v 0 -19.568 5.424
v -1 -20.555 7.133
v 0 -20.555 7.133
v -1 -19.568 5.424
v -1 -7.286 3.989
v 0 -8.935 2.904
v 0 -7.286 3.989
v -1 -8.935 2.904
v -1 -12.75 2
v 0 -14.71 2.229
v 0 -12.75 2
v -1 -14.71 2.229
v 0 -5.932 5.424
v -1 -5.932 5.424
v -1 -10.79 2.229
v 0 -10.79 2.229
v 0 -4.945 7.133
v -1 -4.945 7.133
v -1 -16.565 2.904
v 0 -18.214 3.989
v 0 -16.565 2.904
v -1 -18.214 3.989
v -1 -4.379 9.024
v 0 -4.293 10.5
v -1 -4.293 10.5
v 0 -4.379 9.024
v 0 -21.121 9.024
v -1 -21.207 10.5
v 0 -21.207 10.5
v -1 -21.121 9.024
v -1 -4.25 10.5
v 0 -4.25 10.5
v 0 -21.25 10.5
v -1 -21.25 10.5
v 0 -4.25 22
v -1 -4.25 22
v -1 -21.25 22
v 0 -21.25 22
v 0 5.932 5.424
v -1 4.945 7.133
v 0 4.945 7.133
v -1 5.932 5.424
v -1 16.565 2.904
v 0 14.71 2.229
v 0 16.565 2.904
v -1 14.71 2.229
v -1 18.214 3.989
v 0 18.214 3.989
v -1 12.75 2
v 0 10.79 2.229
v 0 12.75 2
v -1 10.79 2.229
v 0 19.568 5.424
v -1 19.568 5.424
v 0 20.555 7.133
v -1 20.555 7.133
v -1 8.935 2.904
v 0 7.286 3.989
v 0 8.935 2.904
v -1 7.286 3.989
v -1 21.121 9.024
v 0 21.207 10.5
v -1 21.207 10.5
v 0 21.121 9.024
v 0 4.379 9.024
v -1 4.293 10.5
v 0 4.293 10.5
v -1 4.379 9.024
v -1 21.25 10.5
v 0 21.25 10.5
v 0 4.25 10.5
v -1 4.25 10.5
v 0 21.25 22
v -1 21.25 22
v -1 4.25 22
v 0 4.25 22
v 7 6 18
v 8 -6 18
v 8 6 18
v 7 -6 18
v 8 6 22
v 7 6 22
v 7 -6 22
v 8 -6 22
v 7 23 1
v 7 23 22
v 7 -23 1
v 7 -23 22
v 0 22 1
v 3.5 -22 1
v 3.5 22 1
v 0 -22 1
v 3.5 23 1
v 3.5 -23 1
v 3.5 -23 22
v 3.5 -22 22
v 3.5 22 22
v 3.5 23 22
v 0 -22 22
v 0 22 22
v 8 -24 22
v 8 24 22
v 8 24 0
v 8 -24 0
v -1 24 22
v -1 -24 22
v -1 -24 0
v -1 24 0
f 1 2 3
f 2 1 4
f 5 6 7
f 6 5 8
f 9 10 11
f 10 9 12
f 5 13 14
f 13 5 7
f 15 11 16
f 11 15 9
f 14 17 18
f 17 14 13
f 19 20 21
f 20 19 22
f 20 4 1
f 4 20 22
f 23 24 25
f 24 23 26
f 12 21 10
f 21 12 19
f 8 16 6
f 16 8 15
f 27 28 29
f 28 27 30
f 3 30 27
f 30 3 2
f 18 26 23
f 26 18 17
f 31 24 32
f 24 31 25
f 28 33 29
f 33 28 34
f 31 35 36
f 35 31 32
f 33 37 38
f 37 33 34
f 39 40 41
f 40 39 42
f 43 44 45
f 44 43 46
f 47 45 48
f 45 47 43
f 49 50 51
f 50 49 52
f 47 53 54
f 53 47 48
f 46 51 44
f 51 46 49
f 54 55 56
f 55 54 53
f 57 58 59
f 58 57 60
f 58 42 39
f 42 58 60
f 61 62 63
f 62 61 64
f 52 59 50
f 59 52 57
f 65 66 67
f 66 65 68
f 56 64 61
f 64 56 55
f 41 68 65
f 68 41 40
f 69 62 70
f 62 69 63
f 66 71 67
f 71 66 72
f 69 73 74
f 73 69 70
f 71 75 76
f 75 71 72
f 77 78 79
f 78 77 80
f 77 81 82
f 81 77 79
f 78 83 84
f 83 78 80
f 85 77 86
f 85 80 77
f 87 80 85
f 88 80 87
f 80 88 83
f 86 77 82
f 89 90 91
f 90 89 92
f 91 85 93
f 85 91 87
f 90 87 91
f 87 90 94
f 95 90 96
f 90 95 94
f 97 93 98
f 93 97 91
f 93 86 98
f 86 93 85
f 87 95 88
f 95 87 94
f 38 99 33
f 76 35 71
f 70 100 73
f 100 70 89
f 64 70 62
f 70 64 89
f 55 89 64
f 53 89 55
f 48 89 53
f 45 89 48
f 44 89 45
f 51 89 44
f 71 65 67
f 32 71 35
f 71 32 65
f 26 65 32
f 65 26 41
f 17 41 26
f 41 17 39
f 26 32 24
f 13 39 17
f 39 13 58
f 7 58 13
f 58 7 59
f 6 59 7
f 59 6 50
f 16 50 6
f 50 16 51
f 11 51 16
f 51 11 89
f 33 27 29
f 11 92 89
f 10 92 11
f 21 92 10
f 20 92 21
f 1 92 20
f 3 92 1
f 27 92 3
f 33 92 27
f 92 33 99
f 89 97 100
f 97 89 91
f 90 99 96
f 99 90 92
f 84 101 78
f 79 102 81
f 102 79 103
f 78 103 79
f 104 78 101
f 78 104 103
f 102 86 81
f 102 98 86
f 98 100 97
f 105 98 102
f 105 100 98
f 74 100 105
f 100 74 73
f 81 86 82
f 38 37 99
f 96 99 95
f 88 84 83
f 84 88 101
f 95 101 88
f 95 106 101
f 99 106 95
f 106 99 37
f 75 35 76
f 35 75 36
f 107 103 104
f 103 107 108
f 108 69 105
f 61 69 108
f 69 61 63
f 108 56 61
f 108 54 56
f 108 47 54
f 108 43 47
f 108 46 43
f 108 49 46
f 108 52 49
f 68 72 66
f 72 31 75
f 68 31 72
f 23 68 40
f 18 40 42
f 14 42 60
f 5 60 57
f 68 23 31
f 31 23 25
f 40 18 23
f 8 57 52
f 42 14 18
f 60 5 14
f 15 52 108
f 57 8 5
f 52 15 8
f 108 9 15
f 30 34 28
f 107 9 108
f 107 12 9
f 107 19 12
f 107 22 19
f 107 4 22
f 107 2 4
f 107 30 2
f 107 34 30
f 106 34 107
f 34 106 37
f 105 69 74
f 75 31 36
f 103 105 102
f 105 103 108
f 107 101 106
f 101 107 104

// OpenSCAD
usw=46;
ush=21;
ust=7;
wt=1;

module us_box() {
    color("aqua") translate([-wt, -usw/2-wt, 0]) {
        cube([ust+2*wt, usw+2*wt, ush+wt]);
    }
}

module us_hole() {
    d=17;
    t=10;
    dx=25.5;
    
    // front holes
    color("yellow") translate([-t/2, -dx/2, d/2+2]) {
        union() {
            rotate(90, [0, 1, 0]) cylinder(h=t, r=d/2);
            translate([0, -d/2, 0]) cube([t, d, d]);
        }
        translate([0, dx, 0]) union() {
            rotate(90, [0, 1, 0]) cylinder(h=t, r=d/2);
            translate([0, -d/2, 0]) cube([t, d, d]);
        }
        
    }
    // back hole
    color("yellow") translate([ust-wt/2, -6, wt+ush-4]) cube([wt*2+2, 12, 4.1]);
    
    // inside holes
    color("red") translate([ust/2, -usw/2, wt]) cube([ust/2, usw, ush+0.1]);
    color("green") translate([0, -usw/2+wt, wt]) cube([ust/2+0.1, usw-2*wt, ush+0.1]);
}

module us_holder() {
    difference() {
        us_box();
        us_hole();
    }
}

us_holder();
